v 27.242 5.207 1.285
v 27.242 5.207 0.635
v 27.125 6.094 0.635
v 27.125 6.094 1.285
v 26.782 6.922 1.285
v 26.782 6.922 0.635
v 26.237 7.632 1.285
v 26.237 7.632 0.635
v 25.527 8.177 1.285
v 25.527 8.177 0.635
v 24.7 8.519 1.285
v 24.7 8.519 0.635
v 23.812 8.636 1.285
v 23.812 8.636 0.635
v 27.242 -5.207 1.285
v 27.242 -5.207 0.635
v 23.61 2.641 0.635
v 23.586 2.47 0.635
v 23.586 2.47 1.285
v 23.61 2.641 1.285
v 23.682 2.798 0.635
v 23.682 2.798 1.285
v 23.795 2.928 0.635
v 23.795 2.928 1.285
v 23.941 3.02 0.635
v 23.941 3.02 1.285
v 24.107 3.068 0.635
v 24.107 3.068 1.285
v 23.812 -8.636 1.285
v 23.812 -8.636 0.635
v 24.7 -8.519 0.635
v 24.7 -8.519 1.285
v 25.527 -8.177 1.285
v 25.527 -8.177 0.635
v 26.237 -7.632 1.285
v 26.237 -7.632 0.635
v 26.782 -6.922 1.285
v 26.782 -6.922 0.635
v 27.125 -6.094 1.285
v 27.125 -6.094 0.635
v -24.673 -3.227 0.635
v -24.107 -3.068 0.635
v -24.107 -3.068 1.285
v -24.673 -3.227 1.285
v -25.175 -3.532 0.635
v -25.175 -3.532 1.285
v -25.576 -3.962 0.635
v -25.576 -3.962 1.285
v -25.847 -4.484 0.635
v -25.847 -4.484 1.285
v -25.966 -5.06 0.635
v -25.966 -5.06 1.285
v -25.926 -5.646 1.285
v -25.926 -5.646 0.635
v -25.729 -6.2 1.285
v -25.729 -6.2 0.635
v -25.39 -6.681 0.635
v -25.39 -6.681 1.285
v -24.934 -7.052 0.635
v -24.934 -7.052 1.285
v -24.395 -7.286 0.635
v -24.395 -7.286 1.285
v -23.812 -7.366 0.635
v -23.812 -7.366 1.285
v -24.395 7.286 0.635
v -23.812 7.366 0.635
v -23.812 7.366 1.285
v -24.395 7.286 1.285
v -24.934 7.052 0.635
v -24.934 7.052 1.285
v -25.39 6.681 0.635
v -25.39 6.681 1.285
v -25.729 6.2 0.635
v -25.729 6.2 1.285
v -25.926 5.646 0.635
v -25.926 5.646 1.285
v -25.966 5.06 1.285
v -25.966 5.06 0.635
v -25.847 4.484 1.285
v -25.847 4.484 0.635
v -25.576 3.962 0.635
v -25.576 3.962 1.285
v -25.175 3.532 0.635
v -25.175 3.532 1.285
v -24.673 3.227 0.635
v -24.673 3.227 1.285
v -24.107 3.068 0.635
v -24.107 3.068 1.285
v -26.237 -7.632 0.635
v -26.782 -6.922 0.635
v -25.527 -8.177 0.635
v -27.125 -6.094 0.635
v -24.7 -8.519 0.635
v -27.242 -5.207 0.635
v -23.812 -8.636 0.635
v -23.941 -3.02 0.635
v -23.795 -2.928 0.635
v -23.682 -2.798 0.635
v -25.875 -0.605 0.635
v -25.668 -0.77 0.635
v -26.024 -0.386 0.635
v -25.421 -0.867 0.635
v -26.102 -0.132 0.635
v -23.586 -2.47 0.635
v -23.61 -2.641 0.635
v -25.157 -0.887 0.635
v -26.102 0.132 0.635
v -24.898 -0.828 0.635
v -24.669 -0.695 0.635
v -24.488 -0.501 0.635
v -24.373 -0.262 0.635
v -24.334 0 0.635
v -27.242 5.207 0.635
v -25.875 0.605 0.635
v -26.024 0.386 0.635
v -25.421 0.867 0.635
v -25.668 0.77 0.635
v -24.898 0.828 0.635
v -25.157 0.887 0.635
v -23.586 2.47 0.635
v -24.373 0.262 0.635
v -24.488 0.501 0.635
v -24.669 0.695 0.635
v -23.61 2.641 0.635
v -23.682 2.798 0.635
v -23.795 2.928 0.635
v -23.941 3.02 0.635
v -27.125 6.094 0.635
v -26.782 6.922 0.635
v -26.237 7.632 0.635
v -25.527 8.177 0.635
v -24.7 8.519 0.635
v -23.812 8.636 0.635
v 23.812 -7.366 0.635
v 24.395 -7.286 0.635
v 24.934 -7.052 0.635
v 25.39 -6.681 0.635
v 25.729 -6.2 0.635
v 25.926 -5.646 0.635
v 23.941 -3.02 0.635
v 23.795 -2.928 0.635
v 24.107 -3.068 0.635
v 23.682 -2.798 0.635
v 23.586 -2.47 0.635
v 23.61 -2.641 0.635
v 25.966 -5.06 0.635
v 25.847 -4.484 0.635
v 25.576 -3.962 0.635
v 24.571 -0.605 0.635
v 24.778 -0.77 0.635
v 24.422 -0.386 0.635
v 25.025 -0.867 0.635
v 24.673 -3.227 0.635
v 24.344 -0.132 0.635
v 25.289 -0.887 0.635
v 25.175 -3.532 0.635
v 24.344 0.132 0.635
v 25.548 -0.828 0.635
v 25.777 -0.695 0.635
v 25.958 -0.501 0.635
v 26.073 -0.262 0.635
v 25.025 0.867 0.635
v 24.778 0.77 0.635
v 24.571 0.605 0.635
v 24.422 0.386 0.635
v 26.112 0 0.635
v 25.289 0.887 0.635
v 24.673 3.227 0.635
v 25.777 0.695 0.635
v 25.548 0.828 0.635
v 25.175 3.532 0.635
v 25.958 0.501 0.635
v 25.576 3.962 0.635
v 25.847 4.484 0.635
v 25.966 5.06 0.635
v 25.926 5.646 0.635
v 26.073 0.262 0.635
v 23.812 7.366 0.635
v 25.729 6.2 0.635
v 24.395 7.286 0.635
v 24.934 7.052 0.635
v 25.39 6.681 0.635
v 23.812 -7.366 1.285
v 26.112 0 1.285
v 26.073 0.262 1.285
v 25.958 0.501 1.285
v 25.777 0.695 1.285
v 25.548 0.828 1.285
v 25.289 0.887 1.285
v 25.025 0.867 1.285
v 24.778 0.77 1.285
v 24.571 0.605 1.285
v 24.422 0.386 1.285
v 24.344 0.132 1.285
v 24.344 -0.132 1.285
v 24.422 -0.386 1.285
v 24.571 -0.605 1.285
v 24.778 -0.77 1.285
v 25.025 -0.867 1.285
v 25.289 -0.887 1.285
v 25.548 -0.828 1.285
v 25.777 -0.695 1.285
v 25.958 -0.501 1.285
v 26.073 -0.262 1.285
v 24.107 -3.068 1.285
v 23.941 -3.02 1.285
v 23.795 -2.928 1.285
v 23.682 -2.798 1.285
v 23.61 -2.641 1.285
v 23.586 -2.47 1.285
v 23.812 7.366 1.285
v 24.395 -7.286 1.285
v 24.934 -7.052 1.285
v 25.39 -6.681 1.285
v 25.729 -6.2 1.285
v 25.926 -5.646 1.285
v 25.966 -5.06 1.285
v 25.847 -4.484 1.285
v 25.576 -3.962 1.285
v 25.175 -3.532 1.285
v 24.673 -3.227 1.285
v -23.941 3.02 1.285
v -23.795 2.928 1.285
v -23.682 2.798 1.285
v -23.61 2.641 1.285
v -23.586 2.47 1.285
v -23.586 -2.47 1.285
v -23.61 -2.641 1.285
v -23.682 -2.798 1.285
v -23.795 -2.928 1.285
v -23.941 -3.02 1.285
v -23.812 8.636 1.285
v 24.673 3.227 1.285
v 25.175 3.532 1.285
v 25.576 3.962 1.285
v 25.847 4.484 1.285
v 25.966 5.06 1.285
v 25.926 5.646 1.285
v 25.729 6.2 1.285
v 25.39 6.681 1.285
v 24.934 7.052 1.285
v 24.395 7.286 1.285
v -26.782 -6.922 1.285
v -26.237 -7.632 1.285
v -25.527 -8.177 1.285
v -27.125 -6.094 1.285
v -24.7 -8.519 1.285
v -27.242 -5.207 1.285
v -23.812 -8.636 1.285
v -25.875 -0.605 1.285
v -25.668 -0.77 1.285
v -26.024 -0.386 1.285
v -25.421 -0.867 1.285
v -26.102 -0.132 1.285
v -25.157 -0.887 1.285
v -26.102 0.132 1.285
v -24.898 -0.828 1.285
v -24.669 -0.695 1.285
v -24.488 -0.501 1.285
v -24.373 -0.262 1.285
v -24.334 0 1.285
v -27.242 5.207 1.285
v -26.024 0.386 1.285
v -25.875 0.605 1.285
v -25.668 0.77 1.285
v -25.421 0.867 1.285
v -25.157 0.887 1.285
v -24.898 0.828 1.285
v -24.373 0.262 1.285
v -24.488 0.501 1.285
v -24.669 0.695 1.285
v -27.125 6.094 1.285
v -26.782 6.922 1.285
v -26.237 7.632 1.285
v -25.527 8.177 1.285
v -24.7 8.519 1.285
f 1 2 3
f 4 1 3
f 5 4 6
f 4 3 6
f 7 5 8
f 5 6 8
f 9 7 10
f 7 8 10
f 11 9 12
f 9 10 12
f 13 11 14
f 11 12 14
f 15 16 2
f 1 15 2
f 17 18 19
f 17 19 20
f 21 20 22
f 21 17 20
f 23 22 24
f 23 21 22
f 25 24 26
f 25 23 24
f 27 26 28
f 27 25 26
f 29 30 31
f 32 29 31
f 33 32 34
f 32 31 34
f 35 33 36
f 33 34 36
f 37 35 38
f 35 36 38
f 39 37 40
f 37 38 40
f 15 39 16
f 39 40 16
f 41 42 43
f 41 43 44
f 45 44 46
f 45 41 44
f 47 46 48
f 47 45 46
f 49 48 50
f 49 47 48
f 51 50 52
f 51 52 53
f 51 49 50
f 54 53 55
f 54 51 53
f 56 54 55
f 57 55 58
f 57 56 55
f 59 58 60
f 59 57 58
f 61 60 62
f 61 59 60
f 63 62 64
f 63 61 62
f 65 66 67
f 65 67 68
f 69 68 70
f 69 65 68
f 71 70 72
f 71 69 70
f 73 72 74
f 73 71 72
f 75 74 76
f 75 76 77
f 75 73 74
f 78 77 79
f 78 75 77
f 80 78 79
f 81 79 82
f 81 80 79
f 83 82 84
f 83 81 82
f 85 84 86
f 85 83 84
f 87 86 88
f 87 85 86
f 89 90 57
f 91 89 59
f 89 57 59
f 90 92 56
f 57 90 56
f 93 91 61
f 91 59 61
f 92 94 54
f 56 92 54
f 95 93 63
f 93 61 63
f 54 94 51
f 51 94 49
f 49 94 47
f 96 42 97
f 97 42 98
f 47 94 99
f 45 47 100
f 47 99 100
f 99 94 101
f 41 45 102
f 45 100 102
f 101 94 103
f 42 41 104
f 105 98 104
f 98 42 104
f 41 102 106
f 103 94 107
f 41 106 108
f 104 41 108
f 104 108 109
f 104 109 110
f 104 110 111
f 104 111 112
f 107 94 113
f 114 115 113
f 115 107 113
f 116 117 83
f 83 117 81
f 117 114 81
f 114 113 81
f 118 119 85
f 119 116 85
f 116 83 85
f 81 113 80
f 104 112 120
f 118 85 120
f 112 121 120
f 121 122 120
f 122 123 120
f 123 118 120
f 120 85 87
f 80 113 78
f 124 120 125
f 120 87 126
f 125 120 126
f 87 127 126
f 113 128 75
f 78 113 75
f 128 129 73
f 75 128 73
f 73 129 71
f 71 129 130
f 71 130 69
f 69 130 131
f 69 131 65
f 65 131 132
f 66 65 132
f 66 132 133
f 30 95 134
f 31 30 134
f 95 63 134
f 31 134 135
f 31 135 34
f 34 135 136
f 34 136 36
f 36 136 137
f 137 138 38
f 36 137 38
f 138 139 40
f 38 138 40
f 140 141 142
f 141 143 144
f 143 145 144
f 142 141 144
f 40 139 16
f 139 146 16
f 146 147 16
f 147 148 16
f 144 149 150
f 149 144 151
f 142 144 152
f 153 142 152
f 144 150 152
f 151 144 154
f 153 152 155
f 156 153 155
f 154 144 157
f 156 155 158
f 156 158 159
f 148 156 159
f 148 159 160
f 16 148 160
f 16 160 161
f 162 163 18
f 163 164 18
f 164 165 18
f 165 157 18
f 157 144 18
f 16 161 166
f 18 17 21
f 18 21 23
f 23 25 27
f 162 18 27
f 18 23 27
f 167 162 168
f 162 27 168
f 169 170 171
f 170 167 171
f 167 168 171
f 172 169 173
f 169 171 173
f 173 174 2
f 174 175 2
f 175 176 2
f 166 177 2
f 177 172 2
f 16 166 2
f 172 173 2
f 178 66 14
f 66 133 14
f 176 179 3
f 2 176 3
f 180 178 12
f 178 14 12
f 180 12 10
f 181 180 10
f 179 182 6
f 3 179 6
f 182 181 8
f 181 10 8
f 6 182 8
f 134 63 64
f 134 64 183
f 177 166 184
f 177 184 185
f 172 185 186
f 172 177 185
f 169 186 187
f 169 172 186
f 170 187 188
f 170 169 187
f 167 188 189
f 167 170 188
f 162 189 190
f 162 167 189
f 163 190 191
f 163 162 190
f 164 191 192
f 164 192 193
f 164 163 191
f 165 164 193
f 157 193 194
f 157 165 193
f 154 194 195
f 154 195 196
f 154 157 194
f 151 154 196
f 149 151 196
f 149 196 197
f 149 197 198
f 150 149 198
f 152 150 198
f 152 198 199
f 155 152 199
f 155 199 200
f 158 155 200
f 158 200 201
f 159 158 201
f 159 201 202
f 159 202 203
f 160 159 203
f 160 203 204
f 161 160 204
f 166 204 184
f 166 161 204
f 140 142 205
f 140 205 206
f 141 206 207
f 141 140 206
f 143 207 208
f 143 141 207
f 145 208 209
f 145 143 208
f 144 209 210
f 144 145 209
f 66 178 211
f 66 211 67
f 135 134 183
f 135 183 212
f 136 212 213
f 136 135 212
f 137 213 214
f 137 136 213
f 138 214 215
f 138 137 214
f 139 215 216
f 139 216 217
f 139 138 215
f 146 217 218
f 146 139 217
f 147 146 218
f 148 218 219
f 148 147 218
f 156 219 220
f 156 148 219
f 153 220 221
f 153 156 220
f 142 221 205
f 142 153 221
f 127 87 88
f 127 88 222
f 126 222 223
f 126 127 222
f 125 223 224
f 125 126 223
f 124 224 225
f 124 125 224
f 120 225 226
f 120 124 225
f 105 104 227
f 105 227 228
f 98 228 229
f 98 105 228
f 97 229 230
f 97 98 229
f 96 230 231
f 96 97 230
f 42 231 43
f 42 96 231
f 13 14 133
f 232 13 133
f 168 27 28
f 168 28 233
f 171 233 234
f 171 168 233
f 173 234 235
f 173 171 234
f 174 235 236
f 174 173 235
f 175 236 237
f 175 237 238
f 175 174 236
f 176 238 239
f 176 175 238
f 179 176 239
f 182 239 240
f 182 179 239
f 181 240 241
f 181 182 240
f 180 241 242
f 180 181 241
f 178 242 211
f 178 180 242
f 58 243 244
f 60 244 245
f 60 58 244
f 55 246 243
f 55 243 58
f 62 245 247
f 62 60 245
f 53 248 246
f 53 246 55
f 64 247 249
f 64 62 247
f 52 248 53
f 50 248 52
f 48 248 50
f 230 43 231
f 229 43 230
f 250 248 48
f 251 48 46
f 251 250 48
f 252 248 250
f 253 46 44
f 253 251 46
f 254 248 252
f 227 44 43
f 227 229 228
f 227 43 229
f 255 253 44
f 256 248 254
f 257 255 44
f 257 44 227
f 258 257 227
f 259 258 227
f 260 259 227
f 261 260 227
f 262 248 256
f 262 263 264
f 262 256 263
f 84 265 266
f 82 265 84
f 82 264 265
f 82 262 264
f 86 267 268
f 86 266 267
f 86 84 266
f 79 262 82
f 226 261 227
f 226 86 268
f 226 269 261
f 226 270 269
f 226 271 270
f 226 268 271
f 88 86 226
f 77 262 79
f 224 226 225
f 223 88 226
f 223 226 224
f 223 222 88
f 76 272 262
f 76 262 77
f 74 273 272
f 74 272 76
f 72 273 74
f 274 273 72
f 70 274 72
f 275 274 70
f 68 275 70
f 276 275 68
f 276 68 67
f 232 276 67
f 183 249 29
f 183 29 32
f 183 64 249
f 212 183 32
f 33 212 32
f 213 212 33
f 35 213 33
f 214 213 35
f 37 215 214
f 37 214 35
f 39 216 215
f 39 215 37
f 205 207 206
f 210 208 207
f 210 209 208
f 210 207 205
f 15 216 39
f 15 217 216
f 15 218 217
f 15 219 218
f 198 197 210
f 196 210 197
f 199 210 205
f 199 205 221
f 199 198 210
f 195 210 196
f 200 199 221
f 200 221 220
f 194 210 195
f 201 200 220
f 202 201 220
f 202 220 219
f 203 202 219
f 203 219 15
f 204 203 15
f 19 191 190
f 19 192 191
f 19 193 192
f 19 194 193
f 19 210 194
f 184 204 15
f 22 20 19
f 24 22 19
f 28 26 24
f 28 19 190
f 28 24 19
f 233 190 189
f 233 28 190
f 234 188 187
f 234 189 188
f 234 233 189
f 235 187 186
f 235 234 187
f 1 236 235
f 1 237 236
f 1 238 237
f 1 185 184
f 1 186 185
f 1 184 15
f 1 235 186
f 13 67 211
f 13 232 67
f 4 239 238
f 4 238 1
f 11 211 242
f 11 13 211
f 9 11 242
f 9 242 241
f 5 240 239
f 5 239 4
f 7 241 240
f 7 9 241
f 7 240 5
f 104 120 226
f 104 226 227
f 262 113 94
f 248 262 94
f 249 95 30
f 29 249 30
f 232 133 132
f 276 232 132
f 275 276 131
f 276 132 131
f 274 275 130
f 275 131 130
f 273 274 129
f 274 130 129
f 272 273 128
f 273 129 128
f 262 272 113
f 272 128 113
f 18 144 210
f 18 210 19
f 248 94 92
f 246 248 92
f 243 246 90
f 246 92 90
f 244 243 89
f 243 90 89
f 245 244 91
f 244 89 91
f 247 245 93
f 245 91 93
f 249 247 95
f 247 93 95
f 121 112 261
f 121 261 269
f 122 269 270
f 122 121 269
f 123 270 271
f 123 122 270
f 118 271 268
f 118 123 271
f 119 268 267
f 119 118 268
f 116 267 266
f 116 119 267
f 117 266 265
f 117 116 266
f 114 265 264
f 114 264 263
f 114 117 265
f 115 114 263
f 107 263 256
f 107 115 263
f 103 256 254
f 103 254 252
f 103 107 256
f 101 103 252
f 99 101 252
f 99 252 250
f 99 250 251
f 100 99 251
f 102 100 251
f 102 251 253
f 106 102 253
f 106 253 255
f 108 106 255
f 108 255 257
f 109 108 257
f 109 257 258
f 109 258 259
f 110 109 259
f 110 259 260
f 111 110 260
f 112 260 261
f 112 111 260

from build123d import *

# Parameters (mm, degrees)
SKETCH2_R           = 0.889
BOSS_EXTRUDE1_DEPTH = 0.65


with BuildPart() as part:
    # Sketch2 → Boss-Extrude1 (new body)
    with BuildSketch(Plane.XY.offset(0.635)):
        with BuildLine():
            Line((23.8125, 8.636), (-23.8125, 8.636))
            ThreePointArc((-23.8125, 8.636), (-26.237169153, 7.631669153), (-27.2415, 5.207))
            Line((-27.2415, 5.207), (-27.2415, -5.207))
            ThreePointArc((-27.2415, -5.207), (-26.237169153, -7.631669153), (-23.8125, -8.636))
            Line((-23.8125, -8.636), (23.8125, -8.636))
            ThreePointArc((23.8125, -8.636), (26.237169153, -7.631669153), (27.2415, -5.207))
            Line((27.2415, -5.207), (27.2415, 5.207))
            ThreePointArc((27.2415, 5.207), (26.237169153, 7.631669153), (23.8125, 8.636))
        make_face()
        with Locations((-25.223, 0)):
            Circle(SKETCH2_R, mode=Mode.SUBTRACT)
        with Locations((25.223, 0)):
            Circle(SKETCH2_R, mode=Mode.SUBTRACT)
        with BuildLine():
            Line((23.5855, -2.470494747), (23.5855, 2.470494747))
            ThreePointArc((23.5855, 2.470494747), (23.734063659, 2.866942592), (24.10658046, 3.068122331))
            ThreePointArc((24.10658046, 3.068122331), (25.966463543, 5.354384043), (23.8125, 7.366))
            Line((23.8125, 7.366), (-23.8125, 7.366))
            ThreePointArc((-23.8125, 7.366), (-25.966463543, 5.354384043), (-24.10658046, 3.068122331))
            ThreePointArc((-24.10658046, 3.068122331), (-23.734063659, 2.866942592), (-23.5855, 2.470494747))
            Line((-23.5855, 2.470494747), (-23.5855, -2.470494747))
            ThreePointArc((-23.5855, -2.470494747), (-23.734063659, -2.866942592), (-24.10658046, -3.068122331))
            ThreePointArc((-24.10658046, -3.068122331), (-25.966463543, -5.354384043), (-23.8125, -7.366))
            Line((-23.8125, -7.366), (23.8125, -7.366))
            ThreePointArc((23.8125, -7.366), (25.966463543, -5.354384043), (24.10658046, -3.068122331))
            ThreePointArc((24.10658046, -3.068122331), (23.734063659, -2.866942592), (23.5855, -2.470494747))
        make_face(mode=Mode.SUBTRACT)
    extrude(amount=BOSS_EXTRUDE1_DEPTH)


solid = part.part
